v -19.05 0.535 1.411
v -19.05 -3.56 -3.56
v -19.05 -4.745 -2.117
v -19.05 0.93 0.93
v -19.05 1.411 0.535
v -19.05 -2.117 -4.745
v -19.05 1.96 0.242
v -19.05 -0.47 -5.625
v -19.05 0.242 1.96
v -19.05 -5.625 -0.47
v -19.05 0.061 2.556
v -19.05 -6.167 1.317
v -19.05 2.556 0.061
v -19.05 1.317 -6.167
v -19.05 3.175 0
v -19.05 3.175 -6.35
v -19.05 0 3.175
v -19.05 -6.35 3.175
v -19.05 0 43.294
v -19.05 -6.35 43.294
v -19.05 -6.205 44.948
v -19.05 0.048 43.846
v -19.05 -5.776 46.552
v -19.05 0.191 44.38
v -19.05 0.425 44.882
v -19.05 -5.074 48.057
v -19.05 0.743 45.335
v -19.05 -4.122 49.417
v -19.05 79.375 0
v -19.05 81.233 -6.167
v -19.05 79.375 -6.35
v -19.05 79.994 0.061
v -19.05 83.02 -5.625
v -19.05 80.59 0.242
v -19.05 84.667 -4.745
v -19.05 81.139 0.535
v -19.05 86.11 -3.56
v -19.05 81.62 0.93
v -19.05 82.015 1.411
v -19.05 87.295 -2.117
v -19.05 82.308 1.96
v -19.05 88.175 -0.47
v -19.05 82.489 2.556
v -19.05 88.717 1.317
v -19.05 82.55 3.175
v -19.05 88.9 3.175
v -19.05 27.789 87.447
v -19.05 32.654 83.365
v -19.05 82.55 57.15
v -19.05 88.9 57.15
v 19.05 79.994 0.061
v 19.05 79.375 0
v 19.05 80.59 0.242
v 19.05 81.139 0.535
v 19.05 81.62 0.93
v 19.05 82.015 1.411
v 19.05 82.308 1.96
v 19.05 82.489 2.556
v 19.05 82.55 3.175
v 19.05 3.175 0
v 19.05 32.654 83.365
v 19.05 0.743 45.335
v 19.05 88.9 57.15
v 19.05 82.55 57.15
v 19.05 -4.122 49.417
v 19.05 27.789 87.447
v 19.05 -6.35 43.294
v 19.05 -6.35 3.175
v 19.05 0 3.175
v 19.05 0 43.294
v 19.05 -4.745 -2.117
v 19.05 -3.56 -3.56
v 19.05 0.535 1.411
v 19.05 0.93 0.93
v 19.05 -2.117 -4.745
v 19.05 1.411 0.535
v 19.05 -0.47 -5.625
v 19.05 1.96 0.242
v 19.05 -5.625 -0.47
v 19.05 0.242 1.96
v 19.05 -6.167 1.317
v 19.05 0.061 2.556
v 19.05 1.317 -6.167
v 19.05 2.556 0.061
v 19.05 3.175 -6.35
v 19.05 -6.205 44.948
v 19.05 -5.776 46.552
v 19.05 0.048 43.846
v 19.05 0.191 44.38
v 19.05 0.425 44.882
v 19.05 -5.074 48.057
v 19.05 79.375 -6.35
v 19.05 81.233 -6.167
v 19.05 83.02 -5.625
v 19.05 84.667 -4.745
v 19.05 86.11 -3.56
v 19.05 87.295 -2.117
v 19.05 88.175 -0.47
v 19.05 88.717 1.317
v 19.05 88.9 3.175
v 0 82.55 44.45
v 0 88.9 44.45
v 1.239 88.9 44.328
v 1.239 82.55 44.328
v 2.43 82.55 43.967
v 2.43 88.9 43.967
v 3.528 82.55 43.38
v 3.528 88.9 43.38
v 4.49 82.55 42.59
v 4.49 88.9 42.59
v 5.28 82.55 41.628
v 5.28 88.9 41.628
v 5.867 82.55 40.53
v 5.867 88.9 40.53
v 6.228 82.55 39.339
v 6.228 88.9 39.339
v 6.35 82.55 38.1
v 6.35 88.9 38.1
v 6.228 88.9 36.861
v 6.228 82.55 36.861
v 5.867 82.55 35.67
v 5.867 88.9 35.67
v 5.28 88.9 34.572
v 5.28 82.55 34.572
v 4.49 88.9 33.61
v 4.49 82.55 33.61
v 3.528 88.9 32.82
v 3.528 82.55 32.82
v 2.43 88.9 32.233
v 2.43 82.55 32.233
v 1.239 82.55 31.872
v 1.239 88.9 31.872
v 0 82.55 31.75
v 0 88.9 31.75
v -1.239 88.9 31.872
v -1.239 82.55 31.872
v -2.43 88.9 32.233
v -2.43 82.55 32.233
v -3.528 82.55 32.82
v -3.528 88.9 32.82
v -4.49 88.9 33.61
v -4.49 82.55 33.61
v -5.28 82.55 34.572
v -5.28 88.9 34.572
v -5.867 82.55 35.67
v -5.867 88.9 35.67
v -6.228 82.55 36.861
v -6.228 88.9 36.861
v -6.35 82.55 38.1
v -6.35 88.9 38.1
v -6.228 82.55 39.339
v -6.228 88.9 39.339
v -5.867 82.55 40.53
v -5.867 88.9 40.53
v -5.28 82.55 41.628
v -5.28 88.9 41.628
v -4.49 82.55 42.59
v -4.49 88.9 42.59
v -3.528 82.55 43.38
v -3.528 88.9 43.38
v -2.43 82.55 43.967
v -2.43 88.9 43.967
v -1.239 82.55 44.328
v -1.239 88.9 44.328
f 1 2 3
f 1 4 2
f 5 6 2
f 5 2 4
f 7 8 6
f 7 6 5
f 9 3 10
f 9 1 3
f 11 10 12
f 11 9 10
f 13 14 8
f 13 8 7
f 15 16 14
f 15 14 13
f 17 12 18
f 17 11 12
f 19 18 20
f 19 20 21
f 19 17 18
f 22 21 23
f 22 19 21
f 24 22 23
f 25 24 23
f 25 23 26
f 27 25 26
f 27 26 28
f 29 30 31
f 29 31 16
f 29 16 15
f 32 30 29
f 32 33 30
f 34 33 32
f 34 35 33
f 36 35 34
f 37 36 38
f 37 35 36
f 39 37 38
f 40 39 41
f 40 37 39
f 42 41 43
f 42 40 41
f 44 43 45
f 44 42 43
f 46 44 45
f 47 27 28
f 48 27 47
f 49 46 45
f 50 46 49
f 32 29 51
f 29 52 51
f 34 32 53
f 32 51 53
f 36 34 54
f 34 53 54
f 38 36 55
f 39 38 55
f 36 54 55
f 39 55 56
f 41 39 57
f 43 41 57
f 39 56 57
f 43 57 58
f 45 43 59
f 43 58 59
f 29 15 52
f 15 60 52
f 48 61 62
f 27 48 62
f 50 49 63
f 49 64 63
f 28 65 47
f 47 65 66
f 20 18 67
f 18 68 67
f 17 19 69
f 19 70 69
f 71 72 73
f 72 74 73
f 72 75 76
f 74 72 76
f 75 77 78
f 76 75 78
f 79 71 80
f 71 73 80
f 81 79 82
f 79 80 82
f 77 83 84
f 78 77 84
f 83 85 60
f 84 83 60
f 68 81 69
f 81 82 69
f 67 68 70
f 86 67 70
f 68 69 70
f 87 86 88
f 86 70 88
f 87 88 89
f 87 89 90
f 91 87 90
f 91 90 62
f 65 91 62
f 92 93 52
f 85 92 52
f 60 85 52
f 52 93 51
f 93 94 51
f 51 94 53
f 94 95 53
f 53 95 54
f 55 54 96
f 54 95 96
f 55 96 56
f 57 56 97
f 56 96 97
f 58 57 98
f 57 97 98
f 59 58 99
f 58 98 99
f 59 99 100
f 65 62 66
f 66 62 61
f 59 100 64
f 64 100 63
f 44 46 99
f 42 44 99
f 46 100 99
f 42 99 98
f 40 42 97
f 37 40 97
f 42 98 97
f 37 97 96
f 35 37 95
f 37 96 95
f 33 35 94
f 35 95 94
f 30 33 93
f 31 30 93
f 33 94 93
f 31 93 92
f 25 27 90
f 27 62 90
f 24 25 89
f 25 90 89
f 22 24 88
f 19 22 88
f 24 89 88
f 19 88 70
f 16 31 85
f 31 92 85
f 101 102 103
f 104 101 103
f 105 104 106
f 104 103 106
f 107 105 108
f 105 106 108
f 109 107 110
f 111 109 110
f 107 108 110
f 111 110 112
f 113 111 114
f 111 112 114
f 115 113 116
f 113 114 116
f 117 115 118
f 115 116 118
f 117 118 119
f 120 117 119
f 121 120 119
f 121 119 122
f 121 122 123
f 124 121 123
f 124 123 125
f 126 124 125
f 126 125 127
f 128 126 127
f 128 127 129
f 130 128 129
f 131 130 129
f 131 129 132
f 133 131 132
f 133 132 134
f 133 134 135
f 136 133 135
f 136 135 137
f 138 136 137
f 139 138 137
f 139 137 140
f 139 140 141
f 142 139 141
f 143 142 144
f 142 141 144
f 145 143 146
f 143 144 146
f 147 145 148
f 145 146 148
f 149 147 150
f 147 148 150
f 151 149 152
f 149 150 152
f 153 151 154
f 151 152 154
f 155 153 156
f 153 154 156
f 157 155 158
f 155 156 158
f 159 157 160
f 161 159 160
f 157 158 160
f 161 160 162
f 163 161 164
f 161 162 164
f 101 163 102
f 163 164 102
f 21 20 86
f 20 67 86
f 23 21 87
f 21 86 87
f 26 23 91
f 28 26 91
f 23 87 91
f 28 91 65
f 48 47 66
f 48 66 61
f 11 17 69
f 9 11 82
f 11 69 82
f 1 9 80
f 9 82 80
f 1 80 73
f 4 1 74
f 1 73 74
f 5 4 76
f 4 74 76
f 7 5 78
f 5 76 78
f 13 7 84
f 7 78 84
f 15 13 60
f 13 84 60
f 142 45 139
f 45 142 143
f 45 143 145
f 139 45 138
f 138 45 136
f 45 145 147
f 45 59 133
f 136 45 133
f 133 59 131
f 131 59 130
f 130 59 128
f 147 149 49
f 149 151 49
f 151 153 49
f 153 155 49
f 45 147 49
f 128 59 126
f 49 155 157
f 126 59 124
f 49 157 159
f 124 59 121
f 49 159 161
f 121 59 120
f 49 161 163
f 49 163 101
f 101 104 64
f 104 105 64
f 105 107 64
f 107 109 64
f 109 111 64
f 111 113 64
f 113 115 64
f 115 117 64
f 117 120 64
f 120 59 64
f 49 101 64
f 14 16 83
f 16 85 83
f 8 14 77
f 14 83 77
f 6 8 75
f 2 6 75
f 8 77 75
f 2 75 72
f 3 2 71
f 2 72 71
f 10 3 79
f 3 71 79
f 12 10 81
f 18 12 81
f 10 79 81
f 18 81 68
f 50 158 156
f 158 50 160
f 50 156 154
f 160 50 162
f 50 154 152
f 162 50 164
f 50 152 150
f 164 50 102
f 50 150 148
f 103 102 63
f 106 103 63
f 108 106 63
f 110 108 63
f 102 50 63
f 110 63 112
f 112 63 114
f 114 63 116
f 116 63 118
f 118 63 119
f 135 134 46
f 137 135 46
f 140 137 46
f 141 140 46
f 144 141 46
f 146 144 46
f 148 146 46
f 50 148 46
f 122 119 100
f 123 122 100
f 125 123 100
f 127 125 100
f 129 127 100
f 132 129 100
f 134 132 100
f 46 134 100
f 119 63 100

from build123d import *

# Parameters (mm, degrees)
BASE_EXTRUDE_THIN_DEPTH = 19.05
CUT_EXTRUDE1_REACH      = 132.7
SKETCH2_R               = 6.35


with BuildPart() as part:
    # Sketch1 → Base-Extrude-Thin (new, symmetric)
    with BuildSketch(Plane(origin=(0, 0, 0), x_dir=(0, 0, -1), z_dir=(1, 0, 0))):
        with BuildLine():
            Line((-83.36505771, 32.653610572), (-45.335245167, 0.742808893))
            ThreePointArc((-45.335245167, 0.742808893), (-44.380308461, 0.191475929), (-43.294394506, 0))
            Line((-43.294394506, 0), (-3.175, 0))
            ThreePointArc((-3.175, 0), (-0.92993597, 0.92993597), (0, 3.175))
            Line((0, 3.175), (0, 79.375))
            ThreePointArc((0, 79.375), (-0.92993597, 81.62006403), (-3.175, 82.55))
            Line((-3.175, 82.55), (-57.15, 82.55))
            Line((-57.15, 82.55), (-57.15, 88.9))
            Line((-57.15, 88.9), (-3.175, 88.9))
            ThreePointArc((-3.175, 88.9), (3.560192091, 86.110192091), (6.35, 79.375))
            Line((6.35, 79.375), (6.35, 3.175))
            ThreePointArc((6.35, 3.175), (3.560192091, -3.560192091), (-3.175, -6.35))
            Line((-3.175, -6.35), (-43.294394506, -6.35))
            ThreePointArc((-43.294394506, -6.35), (-46.552136371, -5.775572213), (-49.416946488, -4.121573321))
            Line((-49.416946488, -4.121573321), (-87.446759032, 27.789228358))
            Line((-87.446759032, 27.789228358), (-83.36505771, 32.653610572))
        make_face()
    extrude(amount=BASE_EXTRUDE_THIN_DEPTH, both=True)

    # Sketch2 → Cut-Extrude1 (cut, up to next)
    with BuildSketch(Plane(origin=(0, 88.9, 0), x_dir=(-1, 0, 0), z_dir=(0, 1, 0)), mode=Mode.PRIVATE) as cut_extrude1_sk1:
        with Locations(Location((0, 38.1, 0), (0, 0, 90))):
            Circle(SKETCH2_R)
    cut_extrude1_tool1 = extrude(cut_extrude1_sk1.sketch, amount=-CUT_EXTRUDE1_REACH, mode=Mode.PRIVATE) & part.part
    add(cut_extrude1_tool1.solids().sort_by_distance((0, 88.9, 38.1))[0], mode=Mode.SUBTRACT)


solid = part.part
